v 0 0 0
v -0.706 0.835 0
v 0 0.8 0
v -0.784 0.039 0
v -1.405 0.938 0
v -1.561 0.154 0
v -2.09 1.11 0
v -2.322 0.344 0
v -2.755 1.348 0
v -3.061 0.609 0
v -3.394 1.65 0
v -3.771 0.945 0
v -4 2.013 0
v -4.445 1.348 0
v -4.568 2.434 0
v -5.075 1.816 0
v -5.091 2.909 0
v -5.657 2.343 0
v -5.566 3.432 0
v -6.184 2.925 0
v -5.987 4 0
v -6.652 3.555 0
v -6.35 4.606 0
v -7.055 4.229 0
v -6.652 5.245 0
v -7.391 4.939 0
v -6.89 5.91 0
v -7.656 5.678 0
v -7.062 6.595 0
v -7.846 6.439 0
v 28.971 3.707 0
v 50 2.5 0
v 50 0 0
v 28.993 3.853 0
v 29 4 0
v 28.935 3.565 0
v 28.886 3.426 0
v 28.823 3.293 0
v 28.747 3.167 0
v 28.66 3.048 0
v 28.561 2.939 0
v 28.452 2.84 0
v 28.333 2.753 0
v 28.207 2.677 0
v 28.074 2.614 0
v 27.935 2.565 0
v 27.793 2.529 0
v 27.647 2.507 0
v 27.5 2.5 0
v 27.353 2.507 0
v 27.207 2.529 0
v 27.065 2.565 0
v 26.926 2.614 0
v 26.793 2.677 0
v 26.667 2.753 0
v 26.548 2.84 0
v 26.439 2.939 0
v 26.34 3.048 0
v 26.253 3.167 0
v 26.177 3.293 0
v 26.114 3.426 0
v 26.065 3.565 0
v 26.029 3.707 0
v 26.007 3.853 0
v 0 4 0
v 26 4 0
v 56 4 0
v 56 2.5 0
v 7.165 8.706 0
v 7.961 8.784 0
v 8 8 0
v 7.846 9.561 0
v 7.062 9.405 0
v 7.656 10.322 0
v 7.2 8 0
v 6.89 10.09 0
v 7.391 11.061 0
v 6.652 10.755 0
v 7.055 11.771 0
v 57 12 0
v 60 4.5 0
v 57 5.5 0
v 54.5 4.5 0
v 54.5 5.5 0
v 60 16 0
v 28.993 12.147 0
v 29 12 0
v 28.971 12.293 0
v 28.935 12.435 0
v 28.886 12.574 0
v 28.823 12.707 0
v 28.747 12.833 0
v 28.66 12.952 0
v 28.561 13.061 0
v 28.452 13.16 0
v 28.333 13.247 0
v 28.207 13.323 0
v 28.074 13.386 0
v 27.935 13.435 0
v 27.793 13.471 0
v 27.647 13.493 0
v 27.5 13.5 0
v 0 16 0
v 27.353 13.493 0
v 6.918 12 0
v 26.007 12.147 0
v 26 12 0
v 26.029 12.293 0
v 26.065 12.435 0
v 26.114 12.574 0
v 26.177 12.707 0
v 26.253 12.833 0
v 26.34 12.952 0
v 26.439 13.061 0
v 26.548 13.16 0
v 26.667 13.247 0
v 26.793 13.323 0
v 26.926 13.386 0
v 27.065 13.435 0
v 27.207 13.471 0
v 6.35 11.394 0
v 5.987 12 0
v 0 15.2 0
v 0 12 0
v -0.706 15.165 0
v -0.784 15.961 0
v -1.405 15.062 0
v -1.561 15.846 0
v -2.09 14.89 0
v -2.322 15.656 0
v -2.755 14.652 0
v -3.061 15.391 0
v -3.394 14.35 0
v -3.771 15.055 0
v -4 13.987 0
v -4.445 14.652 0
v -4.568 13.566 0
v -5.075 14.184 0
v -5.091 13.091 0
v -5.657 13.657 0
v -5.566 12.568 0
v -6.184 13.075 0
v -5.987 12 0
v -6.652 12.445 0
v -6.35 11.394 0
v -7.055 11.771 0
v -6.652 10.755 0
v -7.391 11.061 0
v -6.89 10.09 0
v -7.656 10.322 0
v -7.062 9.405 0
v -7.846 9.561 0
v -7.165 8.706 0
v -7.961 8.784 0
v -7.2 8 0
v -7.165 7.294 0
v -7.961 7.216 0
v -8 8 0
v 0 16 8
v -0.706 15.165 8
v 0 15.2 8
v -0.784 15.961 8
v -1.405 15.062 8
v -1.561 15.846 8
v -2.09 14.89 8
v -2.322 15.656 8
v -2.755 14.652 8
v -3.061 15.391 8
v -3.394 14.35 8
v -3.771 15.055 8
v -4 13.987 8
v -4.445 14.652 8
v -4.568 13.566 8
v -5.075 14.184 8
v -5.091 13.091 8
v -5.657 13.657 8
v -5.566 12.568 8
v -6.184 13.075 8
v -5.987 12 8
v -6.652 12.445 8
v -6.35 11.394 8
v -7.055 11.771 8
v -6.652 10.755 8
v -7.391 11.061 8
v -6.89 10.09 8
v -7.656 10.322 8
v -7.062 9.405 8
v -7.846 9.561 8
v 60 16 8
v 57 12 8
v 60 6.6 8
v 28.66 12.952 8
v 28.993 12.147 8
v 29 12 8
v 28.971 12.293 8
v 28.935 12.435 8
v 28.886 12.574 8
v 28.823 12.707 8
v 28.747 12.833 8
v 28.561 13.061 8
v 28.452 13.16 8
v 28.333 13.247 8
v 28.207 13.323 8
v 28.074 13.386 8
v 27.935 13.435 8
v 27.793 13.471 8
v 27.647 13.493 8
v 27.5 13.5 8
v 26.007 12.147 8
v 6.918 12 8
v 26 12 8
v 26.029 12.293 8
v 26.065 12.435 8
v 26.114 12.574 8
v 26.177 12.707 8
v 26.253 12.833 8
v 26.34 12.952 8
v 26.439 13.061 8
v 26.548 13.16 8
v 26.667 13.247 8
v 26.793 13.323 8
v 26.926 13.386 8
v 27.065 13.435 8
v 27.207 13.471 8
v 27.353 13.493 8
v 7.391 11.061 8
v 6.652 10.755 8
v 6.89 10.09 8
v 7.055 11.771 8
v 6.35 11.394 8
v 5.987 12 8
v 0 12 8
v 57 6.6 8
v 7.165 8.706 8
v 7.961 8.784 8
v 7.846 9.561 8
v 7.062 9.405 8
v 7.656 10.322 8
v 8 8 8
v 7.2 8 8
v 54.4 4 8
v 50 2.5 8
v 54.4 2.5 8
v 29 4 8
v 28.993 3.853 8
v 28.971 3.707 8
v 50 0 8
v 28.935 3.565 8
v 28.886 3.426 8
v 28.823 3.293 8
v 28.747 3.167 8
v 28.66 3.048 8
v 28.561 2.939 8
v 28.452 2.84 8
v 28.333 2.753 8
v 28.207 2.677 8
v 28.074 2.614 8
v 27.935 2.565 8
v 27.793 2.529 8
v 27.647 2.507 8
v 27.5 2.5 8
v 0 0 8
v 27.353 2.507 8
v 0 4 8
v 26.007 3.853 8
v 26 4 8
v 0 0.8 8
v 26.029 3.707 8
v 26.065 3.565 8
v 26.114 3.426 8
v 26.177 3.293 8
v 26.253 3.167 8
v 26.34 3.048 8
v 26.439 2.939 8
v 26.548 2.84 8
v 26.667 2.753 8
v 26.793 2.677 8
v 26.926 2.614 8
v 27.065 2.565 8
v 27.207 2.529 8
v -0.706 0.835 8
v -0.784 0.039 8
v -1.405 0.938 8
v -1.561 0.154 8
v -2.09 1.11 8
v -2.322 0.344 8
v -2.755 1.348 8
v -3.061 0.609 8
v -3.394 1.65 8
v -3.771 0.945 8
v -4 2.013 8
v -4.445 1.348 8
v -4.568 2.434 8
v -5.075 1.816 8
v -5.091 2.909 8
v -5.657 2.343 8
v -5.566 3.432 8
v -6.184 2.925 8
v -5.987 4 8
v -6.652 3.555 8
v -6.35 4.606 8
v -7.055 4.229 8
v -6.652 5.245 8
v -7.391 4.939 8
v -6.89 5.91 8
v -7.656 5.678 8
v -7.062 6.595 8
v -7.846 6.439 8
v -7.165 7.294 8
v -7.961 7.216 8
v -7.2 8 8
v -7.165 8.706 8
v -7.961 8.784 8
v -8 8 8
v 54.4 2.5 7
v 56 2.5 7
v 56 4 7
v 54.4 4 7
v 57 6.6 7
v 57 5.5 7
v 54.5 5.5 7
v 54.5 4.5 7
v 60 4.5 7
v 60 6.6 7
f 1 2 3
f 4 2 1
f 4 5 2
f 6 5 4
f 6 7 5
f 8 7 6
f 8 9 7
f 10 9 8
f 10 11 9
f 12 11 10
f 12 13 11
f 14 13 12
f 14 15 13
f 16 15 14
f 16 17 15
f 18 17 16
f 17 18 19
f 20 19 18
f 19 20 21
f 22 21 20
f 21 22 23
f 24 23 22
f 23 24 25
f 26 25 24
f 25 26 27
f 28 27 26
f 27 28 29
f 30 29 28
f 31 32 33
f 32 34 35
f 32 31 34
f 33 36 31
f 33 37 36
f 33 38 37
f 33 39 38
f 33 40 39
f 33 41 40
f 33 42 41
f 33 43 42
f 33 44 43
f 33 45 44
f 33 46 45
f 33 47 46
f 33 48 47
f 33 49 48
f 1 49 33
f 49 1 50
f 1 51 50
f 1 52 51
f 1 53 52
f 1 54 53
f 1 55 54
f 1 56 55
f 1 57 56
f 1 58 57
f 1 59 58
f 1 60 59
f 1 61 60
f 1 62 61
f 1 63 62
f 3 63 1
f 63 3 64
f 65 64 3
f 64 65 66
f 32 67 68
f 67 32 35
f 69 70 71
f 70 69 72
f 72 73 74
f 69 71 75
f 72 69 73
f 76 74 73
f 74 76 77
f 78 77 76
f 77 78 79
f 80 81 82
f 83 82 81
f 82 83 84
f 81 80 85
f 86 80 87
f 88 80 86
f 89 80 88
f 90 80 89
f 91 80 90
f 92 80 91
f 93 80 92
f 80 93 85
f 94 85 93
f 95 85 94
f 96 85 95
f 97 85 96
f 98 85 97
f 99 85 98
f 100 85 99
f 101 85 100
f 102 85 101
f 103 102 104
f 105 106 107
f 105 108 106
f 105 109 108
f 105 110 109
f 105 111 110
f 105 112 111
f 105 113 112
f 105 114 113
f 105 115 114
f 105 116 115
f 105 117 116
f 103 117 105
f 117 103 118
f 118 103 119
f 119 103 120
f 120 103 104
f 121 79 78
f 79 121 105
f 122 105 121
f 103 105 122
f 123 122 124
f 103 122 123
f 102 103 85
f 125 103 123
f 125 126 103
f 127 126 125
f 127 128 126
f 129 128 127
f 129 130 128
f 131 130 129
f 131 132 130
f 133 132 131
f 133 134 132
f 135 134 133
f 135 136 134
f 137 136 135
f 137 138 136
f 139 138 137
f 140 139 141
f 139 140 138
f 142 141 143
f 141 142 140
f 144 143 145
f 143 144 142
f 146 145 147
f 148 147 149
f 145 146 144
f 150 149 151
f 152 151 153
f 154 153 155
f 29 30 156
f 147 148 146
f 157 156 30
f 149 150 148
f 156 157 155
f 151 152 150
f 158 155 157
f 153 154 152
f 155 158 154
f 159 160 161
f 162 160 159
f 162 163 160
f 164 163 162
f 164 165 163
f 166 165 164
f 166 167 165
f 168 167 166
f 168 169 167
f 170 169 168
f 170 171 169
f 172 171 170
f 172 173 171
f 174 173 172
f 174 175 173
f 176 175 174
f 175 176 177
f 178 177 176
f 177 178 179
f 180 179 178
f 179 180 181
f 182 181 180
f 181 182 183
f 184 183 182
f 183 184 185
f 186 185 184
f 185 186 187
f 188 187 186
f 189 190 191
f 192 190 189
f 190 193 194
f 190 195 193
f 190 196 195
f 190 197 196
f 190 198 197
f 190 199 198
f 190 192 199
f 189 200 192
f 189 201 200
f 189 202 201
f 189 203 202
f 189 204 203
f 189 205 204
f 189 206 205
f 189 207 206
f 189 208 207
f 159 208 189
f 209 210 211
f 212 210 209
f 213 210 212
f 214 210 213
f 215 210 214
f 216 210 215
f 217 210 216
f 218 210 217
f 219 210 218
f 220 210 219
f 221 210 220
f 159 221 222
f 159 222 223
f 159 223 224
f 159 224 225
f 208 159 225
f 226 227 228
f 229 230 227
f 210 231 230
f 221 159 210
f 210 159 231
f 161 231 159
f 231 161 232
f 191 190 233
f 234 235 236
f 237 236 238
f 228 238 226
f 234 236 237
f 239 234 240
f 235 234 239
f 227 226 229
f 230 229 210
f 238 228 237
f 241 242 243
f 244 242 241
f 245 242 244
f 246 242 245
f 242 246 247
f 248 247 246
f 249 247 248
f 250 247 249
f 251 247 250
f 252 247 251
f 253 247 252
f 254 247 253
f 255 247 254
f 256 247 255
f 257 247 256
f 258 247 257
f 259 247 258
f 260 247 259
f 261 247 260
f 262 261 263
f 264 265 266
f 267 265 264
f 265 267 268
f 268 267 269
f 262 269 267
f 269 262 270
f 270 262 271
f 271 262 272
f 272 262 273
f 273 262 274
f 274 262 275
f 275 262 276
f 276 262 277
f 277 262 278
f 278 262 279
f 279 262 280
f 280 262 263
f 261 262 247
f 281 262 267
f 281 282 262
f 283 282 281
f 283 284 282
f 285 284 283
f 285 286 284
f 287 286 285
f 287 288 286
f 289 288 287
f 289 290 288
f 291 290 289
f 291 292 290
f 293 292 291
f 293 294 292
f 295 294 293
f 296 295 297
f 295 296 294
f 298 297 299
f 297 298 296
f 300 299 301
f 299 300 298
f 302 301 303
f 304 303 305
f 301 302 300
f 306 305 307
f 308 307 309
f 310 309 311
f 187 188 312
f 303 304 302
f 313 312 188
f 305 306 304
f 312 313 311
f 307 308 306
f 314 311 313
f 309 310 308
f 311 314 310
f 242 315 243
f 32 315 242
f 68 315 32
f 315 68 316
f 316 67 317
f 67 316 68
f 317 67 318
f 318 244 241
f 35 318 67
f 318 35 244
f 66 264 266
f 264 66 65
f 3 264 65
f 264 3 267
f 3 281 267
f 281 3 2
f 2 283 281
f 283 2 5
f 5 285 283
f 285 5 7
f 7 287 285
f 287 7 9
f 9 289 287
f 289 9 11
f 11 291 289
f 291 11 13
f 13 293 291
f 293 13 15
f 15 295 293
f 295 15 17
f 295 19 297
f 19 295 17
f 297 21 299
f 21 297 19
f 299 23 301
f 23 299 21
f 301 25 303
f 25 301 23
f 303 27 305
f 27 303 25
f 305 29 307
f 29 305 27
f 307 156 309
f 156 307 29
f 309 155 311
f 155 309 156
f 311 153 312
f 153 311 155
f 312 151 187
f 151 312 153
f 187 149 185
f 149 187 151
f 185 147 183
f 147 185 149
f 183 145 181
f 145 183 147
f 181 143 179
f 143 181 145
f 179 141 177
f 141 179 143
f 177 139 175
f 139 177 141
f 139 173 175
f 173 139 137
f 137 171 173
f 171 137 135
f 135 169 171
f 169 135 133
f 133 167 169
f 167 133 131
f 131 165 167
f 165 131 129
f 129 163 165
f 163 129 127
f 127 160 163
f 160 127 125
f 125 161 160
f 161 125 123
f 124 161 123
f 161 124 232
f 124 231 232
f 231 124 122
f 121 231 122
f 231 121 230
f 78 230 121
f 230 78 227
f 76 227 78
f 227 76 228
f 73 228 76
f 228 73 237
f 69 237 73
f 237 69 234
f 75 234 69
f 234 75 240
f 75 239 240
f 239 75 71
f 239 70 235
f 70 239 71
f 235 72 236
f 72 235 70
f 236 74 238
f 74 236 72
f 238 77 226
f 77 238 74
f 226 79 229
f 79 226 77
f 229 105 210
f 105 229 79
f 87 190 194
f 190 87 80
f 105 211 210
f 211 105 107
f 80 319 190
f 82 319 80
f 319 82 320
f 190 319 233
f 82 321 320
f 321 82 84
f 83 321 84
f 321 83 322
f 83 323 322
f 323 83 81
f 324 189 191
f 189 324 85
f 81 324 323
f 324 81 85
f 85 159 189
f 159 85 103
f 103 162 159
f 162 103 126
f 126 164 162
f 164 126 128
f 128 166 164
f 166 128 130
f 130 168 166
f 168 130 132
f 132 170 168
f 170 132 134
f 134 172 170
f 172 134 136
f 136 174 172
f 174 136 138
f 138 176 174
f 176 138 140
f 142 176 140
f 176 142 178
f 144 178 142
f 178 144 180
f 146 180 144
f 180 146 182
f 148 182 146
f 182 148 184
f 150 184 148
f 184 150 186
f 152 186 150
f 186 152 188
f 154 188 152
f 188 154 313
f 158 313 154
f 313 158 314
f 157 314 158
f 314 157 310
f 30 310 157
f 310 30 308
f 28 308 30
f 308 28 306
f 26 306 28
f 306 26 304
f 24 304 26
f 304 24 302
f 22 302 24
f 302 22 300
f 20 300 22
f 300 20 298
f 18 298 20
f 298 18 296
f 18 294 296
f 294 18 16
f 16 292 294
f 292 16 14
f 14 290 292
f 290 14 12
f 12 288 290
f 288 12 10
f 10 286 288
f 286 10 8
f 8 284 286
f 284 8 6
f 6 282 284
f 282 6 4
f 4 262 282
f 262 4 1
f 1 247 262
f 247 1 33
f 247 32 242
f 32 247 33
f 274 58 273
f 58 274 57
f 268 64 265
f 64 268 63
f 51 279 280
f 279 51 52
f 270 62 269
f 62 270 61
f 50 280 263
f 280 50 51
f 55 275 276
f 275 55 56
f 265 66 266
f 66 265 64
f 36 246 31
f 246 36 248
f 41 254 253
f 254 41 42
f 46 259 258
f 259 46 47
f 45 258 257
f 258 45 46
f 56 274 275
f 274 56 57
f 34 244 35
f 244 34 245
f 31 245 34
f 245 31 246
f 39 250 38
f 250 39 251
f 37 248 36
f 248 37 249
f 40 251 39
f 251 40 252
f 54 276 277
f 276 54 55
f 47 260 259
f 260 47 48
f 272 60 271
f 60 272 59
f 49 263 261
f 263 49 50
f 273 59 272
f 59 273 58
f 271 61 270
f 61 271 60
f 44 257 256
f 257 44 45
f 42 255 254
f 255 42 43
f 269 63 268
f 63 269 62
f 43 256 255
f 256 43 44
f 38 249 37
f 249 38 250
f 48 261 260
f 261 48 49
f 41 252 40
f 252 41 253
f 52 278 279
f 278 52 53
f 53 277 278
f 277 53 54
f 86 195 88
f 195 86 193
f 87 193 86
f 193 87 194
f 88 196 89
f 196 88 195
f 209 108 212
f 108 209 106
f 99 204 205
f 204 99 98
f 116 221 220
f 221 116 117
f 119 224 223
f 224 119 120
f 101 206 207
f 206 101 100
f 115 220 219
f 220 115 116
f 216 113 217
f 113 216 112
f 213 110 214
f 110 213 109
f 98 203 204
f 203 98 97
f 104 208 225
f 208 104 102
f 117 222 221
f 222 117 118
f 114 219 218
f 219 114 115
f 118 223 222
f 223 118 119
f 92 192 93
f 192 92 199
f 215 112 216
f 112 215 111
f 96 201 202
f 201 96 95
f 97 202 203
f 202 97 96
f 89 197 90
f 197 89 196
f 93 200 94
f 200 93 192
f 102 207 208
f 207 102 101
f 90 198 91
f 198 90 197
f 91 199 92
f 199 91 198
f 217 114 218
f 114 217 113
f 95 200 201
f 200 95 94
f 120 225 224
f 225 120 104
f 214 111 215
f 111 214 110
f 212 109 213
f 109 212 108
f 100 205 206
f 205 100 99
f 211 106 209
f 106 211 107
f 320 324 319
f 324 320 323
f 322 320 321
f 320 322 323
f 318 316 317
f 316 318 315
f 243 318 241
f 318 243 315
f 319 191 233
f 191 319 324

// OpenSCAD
// Pinch clamp for silicone tubing (up to 6.4 mm)
// Designed for FDM printing: printed flat in the XY plane.

// --- Dimensions ---
thickness    = 8.0;    // Extrusion height (Z)
lower_len    = 50.0;   // Length of lower jaw bar
lower_y_w    = 4.0;    // Width of lower jaw bar
lower_tongue_len = 6.0; // Length of lower tongue (50 to 56)
lower_tongue_y_start = 2.5;
lower_tongue_y_end   = 4.0;

upper_len    = 60.0;   // Length of upper jaw bar
upper_y_start = 12.0;
upper_y_end   = 16.0;

hinge_center_y = 8.0;
hinge_r_in     = 7.2;
hinge_r_out    = 8.0;

ridge_radius   = 1.5;
ridge_x_pos    = 27.5;
ridge_y_low    = 4.0;
ridge_y_high   = 12.0;

latch_leg_x_start = 57.0;
latch_leg_x_end   = 60.0;
latch_leg_y_start = 4.5;
latch_leg_y_end   = 12.0;

latch_nose_x_start = 54.5;
latch_nose_x_end   = 57.0;
latch_nose_y_start = 4.5;
latch_nose_y_end   = 5.5;
latch_nose_z_offset = 0.5; // 0.5mm above the tongue

$fn = 64;

// --- 2D Profile Construction ---
module profile_2d() {
    // Lower Jaw Bar
    square([lower_len, lower_y_w]);
    
    // Lower Tongue
    translate([lower_len, lower_tongue_y_start])
        square([lower_tongue_len, lower_tongue_y_end - lower_tongue_y_start]);
    
    // Upper Jaw Bar
    translate([0, upper_y_start])
        square([upper_len, upper_y_end - upper_y_start]);
    
    // Hinge (Half-ring on the left side)
    // We use a difference of two half-circles to create the ring profile
    difference() {
        // Outer half-circle
        translate([0, hinge_center_y])
            circle(r = hinge_r_out);
        // Inner half-circle
        translate([0, hinge_center_y])
            circle(r = hinge_r_in);
        // Cut the right half to make it a "half-ring" on the left side
        translate([0, -hinge_r_out])
            square([hinge_r_out, hinge_r_out * 2]);
    }
    
    // Latch Leg
    translate([latch_leg_x_start, latch_leg_y_start])
        square([latch_leg_x_end - latch_leg_x_start, latch_leg_y_end - latch_leg_y_start]);
    
    // Latch Nose
    translate([latch_nose_x_start, latch_nose_y_start])
        square([latch_nose_x_end - latch_nose_x_start, latch_nose_y_end - latch_nose_y_start]);
}

// --- 3D Model Construction ---
// We build the main body by extruding the 2D profile
// Then we subtract the pinch ridges and the latch clearance

difference() {
    // Main Body
    linear_extrude(height = thickness) {
        profile_2d();
    }

    // Pinch Ridges (Subtracted from the inner faces)
    // Lower ridge
    translate([ridge_x_pos, ridge_y_low, -0.01])
        rotate([0, 0, 0]) // Ensure it's oriented correctly
        cylinder(h = thickness + 0.02, r = ridge_radius);
    
    // Upper ridge
    translate([ridge_x_pos, ridge_y_high, -0.01])
        cylinder(h = thickness + 0.02, r = ridge_radius);

    // Latch Clearance (The space for the nose to snap under the tongue)
    // The nose is at z = 0.5 relative to the tongue. 
    // Since the tongue is at z=0 (bottom), the nose is at z=0.5.
    // We create a cutout in the lower jaw to allow the nose to enter.
    translate([latch_nose_x_start - 0.1, lower_tongue_y_start - 0.1, thickness - 1.0])
        cube([lower_tongue_len + 2, lower_y_w + 0.2, 2.0]);
}

// Note: The user requested the part be printed flat on the XY plane.
// The code above builds the part from Z=0 upwards.
